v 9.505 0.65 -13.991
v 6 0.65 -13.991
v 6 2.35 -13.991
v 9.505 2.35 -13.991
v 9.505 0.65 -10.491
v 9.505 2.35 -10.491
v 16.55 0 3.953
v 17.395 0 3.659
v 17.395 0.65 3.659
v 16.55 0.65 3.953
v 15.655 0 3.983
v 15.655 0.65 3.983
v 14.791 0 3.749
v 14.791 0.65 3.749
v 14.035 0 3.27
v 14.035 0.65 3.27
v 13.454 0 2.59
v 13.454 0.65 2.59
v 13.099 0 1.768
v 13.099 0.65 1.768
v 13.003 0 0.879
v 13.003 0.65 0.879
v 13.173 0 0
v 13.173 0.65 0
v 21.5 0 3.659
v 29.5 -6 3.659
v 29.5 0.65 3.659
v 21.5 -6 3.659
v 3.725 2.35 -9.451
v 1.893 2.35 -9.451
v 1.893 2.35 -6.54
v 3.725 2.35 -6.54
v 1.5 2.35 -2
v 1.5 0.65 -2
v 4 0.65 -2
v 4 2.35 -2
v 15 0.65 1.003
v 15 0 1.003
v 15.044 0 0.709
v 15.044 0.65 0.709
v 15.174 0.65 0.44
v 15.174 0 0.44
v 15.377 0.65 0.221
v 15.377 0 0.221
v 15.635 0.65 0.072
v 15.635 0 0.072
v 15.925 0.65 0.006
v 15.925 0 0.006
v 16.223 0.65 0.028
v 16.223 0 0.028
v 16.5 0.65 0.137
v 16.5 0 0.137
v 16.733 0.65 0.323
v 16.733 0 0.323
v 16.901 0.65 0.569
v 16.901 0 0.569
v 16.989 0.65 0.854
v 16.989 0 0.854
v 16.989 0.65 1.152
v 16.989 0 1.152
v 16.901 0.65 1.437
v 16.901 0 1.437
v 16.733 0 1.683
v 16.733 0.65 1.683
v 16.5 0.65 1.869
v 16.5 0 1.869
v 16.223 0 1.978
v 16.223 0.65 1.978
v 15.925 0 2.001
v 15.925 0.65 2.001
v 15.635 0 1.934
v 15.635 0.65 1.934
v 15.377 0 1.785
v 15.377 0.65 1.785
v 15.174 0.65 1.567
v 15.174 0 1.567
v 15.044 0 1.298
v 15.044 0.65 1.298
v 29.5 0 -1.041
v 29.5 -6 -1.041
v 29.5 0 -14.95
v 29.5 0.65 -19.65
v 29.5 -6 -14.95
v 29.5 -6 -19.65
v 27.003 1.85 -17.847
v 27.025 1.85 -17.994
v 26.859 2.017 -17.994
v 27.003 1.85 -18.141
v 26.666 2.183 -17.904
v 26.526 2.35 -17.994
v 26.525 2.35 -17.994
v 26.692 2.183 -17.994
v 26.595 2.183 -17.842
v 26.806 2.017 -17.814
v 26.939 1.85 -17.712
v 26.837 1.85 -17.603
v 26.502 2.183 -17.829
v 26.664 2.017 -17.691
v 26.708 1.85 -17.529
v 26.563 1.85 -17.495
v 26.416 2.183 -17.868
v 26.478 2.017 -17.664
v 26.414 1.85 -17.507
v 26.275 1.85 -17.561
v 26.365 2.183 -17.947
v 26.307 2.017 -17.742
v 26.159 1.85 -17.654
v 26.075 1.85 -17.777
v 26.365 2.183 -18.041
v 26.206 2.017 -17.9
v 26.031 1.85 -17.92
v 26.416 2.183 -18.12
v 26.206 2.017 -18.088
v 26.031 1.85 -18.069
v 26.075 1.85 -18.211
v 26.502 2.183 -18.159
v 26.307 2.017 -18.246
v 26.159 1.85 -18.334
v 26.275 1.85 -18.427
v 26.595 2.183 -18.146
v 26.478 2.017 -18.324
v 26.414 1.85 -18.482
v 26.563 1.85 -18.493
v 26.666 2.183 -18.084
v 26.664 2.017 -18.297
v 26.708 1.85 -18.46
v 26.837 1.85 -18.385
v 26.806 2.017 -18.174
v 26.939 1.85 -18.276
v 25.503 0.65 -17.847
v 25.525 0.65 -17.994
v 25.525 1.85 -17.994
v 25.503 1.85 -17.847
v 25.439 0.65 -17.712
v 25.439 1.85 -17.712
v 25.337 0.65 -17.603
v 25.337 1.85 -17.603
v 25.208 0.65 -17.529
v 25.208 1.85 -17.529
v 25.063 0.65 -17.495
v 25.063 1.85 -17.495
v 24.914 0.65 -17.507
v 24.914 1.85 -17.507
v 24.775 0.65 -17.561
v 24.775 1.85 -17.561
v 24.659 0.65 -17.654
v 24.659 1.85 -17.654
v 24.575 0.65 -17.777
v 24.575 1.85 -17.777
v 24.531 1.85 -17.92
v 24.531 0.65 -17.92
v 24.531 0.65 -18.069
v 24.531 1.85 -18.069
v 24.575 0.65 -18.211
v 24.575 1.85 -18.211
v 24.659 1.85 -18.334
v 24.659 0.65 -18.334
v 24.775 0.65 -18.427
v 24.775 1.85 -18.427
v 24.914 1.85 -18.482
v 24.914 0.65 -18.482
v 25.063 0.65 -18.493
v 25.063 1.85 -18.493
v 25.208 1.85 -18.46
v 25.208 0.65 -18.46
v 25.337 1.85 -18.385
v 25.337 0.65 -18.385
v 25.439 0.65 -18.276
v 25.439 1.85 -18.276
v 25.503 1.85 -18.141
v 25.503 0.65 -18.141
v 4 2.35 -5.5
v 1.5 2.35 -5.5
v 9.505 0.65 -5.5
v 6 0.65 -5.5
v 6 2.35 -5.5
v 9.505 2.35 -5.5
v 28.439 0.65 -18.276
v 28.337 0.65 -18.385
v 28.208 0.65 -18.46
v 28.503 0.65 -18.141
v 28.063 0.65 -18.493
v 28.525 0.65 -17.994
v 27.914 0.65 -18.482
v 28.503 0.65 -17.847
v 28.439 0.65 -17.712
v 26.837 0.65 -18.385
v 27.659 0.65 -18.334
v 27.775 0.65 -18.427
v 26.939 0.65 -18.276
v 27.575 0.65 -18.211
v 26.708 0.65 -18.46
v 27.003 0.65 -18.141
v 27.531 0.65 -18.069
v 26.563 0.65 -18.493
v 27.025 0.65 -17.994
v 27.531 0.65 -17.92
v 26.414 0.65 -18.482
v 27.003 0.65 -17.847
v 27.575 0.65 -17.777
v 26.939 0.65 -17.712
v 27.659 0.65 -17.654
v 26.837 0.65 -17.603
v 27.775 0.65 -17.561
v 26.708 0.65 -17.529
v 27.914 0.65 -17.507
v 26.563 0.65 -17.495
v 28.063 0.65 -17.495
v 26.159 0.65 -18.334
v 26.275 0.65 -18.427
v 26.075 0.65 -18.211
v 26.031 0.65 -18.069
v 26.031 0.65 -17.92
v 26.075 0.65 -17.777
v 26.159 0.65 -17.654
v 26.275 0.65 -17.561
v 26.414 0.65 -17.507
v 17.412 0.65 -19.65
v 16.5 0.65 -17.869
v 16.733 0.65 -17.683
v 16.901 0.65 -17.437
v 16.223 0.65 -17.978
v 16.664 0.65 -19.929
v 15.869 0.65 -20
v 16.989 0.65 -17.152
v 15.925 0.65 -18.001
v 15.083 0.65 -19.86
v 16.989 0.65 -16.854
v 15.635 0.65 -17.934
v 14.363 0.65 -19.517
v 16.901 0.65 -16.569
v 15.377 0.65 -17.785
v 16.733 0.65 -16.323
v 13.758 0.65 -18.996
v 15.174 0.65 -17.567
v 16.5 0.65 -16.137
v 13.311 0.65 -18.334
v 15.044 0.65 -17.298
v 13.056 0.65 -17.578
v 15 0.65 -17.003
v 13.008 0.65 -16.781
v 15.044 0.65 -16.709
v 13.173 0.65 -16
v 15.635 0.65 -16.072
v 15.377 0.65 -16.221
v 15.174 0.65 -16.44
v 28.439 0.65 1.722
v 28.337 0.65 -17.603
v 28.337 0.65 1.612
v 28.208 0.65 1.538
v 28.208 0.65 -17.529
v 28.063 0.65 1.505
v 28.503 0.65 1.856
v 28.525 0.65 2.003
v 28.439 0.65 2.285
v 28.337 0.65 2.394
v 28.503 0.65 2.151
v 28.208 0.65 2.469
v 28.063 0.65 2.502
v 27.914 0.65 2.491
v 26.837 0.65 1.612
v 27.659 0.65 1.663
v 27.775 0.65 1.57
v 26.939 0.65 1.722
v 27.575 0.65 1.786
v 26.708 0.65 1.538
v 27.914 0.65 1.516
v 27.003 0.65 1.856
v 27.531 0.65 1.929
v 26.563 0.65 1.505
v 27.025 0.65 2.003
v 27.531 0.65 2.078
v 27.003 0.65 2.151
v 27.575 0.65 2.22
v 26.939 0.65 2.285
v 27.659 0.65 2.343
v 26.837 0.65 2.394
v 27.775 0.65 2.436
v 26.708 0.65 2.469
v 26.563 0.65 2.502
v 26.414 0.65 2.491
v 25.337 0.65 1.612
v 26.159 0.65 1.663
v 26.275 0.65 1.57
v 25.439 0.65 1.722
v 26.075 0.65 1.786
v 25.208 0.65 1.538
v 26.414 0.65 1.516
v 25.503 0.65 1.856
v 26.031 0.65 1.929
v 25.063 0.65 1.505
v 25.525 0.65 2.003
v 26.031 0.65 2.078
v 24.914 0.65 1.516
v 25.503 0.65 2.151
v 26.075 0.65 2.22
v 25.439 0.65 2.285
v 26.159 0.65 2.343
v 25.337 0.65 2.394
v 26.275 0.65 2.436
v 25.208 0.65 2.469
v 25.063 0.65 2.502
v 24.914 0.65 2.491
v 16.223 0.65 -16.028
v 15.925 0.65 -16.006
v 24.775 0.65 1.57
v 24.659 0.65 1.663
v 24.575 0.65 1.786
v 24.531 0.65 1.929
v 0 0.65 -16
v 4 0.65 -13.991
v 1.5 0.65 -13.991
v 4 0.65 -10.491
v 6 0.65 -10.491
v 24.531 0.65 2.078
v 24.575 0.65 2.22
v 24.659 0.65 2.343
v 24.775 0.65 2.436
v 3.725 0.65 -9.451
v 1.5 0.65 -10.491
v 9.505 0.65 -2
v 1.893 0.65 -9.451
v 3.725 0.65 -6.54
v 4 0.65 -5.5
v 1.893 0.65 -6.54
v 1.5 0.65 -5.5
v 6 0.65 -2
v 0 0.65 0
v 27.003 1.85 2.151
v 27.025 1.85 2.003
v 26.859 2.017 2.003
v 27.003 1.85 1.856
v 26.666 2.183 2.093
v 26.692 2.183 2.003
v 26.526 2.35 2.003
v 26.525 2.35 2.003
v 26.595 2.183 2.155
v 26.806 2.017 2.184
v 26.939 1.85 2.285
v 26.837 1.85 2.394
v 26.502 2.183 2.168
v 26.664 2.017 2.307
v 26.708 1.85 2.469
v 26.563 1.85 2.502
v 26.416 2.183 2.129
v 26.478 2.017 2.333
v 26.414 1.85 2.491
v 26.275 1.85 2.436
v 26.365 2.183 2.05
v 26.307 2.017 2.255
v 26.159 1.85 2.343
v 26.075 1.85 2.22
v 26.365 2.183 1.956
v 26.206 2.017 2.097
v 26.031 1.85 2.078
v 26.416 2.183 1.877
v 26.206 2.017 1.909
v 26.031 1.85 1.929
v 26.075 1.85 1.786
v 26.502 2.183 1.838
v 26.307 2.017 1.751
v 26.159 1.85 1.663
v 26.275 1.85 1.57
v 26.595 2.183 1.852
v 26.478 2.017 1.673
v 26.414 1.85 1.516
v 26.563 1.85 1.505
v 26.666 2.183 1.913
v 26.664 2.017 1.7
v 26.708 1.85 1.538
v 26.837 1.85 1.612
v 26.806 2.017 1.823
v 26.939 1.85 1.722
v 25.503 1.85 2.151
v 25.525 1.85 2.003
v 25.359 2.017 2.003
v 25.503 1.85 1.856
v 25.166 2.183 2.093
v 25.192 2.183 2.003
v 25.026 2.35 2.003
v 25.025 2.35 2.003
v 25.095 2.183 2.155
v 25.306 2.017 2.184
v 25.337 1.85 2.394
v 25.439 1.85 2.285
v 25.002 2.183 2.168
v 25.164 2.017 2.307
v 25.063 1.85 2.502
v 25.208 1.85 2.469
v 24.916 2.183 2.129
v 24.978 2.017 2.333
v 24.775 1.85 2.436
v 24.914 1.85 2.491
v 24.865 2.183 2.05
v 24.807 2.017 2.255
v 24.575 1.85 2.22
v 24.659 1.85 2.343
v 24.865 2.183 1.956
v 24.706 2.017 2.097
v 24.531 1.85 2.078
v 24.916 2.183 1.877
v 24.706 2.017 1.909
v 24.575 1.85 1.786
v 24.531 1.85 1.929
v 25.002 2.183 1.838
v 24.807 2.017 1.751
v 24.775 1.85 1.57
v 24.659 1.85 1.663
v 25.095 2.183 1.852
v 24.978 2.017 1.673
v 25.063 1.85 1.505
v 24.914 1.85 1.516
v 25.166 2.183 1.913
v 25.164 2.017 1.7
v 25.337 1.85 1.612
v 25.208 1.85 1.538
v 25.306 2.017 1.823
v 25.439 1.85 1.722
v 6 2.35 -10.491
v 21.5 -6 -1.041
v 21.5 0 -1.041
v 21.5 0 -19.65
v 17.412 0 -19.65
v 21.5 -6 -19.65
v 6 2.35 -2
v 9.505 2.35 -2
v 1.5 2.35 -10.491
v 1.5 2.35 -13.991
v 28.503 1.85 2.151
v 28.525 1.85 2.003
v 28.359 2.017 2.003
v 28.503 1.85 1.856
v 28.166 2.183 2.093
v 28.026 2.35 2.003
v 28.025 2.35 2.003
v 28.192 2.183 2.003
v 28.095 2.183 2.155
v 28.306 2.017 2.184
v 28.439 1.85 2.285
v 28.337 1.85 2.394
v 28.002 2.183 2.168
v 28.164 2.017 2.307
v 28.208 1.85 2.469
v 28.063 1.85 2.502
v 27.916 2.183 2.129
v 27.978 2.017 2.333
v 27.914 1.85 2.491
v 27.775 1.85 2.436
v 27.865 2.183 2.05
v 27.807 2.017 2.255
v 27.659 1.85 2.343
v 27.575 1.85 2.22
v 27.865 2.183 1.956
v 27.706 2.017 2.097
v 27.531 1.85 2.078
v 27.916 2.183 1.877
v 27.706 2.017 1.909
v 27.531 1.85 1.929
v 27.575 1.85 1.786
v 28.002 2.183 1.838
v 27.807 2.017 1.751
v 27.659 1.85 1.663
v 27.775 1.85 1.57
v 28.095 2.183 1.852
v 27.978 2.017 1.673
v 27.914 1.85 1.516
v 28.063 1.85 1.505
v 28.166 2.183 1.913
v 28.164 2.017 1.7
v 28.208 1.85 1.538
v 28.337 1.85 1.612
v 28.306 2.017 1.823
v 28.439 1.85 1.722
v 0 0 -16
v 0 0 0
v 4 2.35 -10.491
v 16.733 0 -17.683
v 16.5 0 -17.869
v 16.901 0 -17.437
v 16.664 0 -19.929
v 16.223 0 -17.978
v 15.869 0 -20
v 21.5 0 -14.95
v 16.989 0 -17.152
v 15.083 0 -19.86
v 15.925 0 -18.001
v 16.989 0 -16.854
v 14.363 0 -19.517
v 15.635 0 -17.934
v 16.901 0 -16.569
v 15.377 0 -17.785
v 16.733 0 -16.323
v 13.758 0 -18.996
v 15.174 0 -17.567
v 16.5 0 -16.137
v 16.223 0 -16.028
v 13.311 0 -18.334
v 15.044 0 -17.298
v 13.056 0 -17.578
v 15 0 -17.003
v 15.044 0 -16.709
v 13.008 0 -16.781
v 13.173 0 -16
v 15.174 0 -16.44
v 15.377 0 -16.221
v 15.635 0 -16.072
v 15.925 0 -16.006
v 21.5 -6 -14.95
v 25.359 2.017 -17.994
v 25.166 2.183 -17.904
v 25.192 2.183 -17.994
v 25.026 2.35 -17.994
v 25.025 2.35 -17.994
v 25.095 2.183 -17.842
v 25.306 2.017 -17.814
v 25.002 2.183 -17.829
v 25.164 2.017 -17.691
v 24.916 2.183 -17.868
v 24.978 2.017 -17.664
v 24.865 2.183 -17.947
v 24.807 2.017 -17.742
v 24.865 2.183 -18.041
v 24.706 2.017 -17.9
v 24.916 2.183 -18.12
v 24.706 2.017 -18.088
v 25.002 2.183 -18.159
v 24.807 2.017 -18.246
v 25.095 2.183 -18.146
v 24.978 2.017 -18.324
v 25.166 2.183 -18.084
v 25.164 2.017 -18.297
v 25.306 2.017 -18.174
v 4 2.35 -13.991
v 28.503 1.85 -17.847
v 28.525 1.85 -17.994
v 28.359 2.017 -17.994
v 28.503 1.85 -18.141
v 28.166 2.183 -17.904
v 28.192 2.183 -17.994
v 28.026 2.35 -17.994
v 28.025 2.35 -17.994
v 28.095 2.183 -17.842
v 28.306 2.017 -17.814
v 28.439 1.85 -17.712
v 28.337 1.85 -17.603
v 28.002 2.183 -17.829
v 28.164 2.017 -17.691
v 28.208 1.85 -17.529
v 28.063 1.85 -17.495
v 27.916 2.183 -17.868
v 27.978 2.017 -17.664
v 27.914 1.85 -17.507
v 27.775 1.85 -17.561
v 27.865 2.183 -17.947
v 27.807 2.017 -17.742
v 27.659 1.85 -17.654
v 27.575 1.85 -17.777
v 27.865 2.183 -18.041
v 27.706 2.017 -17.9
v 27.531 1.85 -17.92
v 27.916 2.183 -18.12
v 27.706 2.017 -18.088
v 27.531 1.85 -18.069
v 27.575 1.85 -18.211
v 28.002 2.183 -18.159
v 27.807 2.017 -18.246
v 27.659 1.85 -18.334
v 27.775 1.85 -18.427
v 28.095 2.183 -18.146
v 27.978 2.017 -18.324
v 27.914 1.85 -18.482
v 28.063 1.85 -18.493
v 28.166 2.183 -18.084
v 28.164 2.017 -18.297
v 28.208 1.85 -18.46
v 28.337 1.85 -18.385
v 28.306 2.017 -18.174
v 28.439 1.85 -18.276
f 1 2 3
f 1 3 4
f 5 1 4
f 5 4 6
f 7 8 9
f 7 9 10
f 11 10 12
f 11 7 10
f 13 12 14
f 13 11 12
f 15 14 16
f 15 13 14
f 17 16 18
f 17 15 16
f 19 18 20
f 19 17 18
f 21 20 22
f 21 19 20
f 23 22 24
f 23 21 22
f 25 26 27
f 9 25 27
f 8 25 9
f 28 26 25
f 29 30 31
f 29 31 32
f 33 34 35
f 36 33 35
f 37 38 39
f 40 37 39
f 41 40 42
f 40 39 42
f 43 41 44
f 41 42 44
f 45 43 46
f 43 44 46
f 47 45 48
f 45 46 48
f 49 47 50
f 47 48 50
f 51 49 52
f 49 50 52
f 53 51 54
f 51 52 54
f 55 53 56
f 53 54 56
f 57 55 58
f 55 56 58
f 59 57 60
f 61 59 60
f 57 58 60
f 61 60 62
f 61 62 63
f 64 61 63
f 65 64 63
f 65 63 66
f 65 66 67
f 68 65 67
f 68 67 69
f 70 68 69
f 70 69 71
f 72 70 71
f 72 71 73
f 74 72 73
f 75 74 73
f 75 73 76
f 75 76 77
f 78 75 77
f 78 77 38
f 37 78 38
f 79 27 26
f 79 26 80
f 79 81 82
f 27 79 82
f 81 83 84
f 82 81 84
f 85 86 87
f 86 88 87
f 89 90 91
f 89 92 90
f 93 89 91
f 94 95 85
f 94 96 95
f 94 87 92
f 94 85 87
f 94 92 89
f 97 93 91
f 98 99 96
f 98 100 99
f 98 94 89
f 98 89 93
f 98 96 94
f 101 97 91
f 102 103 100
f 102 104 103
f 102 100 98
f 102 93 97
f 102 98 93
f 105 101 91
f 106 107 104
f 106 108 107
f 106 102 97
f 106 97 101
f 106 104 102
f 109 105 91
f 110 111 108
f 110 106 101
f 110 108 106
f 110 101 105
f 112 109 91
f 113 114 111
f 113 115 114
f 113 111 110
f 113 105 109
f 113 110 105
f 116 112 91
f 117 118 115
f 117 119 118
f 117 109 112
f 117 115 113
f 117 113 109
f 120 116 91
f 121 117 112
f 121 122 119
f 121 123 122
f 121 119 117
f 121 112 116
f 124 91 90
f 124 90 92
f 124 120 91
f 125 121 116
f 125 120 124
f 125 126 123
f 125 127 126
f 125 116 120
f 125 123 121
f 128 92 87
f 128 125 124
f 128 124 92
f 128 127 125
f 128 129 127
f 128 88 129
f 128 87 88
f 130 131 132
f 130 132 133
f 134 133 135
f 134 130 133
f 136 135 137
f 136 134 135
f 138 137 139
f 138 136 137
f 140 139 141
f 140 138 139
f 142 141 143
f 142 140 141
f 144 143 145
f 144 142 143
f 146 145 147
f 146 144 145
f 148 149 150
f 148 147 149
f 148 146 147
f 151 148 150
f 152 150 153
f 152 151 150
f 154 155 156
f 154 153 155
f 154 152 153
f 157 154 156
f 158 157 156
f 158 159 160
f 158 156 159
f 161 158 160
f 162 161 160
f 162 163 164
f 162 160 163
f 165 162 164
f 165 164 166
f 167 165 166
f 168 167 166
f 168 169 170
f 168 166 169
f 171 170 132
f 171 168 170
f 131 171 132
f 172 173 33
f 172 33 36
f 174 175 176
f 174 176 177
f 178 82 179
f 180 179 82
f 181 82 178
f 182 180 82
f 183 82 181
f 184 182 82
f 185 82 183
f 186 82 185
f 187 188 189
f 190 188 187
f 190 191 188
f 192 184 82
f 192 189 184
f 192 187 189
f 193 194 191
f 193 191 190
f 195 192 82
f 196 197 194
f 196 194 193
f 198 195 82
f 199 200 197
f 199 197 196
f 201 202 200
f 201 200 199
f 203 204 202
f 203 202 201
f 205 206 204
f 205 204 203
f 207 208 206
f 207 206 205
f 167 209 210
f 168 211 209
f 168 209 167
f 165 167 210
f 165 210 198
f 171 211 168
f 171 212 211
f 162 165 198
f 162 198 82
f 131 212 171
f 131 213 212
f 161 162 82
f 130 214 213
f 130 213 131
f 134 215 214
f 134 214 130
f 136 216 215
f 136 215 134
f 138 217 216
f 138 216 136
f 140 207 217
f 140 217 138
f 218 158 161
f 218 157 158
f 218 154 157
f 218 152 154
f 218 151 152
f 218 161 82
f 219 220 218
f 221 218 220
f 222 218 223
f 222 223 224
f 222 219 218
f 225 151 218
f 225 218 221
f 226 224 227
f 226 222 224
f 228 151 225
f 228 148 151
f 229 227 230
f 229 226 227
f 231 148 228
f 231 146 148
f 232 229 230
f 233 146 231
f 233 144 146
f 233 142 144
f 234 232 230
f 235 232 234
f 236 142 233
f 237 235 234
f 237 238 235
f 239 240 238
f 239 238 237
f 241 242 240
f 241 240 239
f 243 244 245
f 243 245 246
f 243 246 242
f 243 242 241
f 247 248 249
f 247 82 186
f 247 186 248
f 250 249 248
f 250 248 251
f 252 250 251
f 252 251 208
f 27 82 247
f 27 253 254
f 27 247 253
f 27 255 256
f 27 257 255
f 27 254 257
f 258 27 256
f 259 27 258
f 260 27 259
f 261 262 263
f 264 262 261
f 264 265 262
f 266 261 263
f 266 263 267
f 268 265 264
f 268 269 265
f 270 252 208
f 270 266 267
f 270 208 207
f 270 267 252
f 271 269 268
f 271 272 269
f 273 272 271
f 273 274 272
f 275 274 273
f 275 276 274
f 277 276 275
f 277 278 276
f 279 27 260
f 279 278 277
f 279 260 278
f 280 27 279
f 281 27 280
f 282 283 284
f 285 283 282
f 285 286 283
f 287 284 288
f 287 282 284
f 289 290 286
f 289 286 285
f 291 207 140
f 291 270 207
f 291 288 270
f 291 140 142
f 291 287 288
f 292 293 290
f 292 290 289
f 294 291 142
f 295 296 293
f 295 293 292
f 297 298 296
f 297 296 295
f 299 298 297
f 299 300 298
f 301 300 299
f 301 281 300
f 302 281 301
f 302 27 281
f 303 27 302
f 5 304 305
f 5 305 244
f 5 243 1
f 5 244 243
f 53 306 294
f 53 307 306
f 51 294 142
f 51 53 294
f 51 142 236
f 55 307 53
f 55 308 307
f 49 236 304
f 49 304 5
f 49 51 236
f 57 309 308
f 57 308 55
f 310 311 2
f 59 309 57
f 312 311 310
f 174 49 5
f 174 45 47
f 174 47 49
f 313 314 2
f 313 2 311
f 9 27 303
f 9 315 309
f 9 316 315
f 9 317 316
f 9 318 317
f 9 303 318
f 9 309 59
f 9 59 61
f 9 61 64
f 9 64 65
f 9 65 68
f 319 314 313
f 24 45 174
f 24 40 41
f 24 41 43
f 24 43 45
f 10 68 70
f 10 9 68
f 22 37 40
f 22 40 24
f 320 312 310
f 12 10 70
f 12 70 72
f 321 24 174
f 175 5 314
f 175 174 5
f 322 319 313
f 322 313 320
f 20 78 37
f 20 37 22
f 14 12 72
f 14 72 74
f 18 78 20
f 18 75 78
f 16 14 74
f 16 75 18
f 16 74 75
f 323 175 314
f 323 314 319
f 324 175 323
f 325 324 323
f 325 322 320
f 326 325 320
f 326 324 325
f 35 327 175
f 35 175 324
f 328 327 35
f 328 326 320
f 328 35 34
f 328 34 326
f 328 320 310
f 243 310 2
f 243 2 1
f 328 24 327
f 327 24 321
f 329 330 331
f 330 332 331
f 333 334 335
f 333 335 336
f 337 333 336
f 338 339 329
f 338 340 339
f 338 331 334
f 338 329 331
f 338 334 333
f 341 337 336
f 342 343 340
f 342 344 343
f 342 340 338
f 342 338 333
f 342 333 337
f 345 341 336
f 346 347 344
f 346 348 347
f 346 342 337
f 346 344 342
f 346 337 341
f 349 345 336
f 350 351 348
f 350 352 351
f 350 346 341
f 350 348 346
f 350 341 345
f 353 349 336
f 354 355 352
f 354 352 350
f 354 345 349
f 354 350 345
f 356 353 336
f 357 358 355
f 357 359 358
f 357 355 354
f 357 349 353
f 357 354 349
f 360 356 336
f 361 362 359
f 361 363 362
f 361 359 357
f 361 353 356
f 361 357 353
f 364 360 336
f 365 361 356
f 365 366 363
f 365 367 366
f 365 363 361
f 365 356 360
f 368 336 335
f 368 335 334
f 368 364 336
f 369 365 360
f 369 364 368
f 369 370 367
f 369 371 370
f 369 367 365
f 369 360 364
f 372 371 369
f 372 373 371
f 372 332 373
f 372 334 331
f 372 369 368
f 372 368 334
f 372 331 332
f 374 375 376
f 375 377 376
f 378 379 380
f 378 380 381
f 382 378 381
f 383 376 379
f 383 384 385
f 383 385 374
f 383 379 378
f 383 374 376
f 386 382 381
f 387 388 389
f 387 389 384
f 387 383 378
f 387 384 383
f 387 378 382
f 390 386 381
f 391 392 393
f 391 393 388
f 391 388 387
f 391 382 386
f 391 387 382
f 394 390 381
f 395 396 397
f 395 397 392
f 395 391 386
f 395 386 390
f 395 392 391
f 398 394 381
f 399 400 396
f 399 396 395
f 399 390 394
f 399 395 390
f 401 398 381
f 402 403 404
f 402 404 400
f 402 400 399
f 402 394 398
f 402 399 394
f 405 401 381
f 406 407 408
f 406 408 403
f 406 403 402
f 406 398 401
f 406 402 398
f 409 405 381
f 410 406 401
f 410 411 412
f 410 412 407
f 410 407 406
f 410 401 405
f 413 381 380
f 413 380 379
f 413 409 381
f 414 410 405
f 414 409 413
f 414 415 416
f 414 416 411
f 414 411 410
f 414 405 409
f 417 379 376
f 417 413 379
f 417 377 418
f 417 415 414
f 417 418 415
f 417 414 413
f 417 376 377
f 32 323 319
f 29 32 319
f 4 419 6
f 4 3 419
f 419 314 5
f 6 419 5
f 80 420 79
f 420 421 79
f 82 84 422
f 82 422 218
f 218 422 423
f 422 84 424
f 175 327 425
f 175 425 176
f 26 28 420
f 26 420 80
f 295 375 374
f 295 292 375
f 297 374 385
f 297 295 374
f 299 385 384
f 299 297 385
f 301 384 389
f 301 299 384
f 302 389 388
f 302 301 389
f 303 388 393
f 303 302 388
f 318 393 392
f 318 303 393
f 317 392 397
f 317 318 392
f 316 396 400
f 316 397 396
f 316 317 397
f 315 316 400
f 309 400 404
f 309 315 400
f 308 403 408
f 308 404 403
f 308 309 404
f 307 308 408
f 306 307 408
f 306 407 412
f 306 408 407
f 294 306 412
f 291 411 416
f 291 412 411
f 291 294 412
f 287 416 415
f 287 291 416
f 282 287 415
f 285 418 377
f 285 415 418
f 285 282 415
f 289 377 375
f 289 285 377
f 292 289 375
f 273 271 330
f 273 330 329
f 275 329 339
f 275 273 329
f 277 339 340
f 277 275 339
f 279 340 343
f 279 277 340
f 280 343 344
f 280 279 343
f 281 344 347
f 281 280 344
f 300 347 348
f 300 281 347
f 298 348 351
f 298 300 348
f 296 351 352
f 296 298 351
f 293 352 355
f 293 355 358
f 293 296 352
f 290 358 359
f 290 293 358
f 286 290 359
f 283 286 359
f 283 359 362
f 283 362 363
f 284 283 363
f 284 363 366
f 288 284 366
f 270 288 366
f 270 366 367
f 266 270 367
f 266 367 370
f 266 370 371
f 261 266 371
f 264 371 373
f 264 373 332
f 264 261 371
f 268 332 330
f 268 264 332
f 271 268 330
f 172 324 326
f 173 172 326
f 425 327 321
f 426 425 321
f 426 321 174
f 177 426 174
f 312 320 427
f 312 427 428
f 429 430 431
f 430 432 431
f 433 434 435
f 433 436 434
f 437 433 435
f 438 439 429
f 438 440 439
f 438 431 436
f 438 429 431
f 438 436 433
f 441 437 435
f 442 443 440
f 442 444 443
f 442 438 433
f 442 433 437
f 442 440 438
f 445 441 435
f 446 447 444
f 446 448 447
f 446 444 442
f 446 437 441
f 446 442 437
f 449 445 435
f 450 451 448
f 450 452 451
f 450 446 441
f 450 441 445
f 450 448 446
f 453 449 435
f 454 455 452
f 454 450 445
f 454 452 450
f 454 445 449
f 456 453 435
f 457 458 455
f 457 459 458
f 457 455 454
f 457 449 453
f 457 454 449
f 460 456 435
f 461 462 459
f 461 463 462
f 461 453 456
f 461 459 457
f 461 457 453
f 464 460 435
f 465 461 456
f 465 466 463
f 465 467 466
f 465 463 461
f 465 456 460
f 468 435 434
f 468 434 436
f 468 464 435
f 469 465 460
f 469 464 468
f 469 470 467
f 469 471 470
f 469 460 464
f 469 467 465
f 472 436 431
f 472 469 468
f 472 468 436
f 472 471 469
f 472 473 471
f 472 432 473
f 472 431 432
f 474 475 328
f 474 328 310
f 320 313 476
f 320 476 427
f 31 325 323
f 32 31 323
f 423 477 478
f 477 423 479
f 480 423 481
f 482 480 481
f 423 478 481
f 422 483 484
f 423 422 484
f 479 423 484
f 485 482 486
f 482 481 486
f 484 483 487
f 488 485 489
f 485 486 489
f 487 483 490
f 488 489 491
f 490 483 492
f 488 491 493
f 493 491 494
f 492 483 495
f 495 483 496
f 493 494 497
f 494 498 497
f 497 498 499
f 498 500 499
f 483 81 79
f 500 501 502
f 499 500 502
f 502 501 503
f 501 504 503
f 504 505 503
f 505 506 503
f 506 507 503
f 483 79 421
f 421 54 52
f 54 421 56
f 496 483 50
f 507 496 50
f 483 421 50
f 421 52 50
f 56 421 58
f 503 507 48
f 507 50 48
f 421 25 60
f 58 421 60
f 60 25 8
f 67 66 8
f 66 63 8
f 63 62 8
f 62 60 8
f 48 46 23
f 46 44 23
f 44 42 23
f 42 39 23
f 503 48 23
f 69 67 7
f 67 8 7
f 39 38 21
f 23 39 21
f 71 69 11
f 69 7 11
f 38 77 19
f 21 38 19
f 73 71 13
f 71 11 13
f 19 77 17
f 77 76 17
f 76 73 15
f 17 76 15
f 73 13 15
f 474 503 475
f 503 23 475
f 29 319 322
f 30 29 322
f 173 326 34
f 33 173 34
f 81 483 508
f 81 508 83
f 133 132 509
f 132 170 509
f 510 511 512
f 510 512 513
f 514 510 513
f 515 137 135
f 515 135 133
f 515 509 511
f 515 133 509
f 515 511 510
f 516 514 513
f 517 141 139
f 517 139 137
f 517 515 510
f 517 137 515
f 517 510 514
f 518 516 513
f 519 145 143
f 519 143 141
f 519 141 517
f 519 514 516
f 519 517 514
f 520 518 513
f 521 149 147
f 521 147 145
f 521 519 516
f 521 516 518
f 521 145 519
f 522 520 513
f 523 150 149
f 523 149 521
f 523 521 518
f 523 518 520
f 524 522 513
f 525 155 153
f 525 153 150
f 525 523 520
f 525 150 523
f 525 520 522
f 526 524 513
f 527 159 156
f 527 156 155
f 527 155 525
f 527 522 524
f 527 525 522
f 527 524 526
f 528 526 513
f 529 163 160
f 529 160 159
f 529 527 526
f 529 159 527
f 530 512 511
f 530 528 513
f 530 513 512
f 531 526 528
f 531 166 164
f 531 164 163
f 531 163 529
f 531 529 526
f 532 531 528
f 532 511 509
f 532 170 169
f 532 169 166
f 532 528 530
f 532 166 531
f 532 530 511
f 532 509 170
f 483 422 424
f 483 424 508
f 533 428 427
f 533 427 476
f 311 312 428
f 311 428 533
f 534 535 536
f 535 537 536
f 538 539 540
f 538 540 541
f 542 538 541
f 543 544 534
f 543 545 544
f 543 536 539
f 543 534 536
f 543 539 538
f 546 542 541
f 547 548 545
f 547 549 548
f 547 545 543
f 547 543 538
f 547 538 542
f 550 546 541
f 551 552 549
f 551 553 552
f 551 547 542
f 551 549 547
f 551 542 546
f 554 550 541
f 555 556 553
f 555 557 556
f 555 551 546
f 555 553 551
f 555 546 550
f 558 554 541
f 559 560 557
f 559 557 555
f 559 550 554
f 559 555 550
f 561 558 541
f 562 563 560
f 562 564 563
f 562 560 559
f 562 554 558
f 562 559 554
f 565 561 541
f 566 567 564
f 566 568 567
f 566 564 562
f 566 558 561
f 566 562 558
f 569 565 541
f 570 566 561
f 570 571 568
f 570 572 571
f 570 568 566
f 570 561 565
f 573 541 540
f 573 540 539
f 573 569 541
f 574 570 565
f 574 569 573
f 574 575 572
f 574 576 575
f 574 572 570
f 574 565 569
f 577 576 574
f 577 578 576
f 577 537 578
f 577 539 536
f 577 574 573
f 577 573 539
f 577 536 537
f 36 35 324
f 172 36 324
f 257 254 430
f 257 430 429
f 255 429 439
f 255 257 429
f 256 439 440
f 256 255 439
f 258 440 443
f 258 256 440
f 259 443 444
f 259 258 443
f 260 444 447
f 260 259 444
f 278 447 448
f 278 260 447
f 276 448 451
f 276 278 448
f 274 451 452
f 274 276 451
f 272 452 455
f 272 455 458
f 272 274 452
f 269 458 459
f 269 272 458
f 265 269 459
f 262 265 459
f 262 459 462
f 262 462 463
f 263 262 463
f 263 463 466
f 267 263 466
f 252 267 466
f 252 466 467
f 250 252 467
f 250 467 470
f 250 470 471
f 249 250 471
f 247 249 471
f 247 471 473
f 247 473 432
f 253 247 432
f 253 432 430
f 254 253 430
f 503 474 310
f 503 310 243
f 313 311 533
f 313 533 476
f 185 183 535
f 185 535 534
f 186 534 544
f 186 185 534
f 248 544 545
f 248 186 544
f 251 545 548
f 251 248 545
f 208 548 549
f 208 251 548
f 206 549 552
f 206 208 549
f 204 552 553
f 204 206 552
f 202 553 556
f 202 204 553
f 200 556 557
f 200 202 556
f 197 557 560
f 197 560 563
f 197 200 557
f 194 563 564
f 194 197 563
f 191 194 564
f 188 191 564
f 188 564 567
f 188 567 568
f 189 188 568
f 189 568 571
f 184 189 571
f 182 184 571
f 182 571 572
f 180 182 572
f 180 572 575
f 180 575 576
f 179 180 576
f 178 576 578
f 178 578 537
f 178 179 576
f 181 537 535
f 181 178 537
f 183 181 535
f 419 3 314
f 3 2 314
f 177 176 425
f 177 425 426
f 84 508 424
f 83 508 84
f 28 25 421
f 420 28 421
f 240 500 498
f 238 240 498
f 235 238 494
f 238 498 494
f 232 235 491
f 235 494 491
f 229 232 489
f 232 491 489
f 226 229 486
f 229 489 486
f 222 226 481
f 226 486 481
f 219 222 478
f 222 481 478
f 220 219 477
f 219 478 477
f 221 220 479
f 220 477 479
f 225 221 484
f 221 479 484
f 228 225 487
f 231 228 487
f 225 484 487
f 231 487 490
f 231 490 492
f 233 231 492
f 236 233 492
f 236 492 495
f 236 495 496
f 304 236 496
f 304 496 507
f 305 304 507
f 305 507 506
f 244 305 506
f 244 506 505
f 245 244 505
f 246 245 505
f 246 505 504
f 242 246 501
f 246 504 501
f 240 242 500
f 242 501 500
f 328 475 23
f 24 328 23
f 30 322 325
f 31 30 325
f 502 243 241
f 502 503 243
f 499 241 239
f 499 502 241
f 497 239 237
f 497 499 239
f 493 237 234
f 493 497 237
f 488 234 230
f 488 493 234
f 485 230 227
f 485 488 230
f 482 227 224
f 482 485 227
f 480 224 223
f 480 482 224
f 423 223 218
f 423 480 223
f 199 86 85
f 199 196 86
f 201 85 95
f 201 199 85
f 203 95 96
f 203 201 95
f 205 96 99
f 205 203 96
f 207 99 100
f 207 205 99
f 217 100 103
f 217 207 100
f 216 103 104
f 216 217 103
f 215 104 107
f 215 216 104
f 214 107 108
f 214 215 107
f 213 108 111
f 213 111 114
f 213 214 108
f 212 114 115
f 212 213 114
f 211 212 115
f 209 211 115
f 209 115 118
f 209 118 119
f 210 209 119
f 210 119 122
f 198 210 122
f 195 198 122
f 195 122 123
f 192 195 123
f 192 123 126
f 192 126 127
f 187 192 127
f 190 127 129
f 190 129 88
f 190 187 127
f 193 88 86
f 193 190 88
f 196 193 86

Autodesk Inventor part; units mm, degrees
ref_plane "YZ Plane" through (0, 0, 0) normal (1, 0, 0) x (0, 1, 0)
ref_plane "XZ Plane" through (0, 0, 0) normal (0, 1, 0) x (-1, 0, 0)
ref_plane "XY Plane" through (0, 0, 0) normal (0, 0, 1) x (1, 0, 0)
sketch "Sketch1" plane through (0, 0, 0) normal (0, 1, 0) x (-1, 0, 0)
  line L0 (0, 0) -> (0, -16)
  line L1 (0, -16) -> (-13, -16)
  circle A0 centre (48.4003, -12.7173) radius 1 projected
  circle A1 centre (48.4003, 5.2827) radius 1 projected
  line L2 (0, 0) -> (-13, 0)
  line L3 (-16, 0) -> (-16, 1.0033)
  line L4 (-16, -16) -> (-16, -17.0033)
  circle A2 centre (-16, 1.0033) radius 1
  circle A3 centre (-16, -17.0033) radius 1
  arc A4 (-18.8273, -16) -> (-13.1727, -16) centre (-16, -17.0033) ccw
  arc A5 (-13.1727, 0) -> (-18.8273, 0) centre (-16, 1.0033) ccw
  line L5 (-19, 0) -> (-29.5, 0)
  line L6 (-19, -16) -> (-29.5, -16)
  line L7 (-29.5, 0) -> (-29.5, -16)
  line L8 (-29.5, -8) -> (-29.5, -19.65)
  line L9 (-29.5, -8) -> (-29.5, 3.6592)
  line L10 (-29.5, 3.6592) -> (-17.3951, 3.6592)
  line L11 (-29.5, -19.65) -> (-17.4124, -19.65)
  line L12 (-13, 0) -> (-13.1727, 0)
  line L13 (-18.8273, 0) -> (-19, 0)
  line L14 (-13, -16) -> (-13.1727, -16)
  line L15 (-18.8273, -16) -> (-19, -16)
  dimension "d0" = 16
  dimension "d1" = 13
  dimension "d2" = 6
  dimension "d3" = 1.0033
  dimension "d4" = 1.0033
  dimension "d5" = 2
  dimension "d6" = 2
  dimension "d7" = 6
  dimension "d8" = 6
  dimension "d9" = 6
  dimension "d10" = 13
  dimension "d11" = 10.5
  dimension "d12" = 11.65
extrude "Extrusion1" add sketch "Sketch1" along normal blind 0.65 contours L0 L1 L14 A4 L15 L6 L7 L5 L13 A5 L12 L2 | A5 L13 L5 L9 L10 | L11 L8 L6 L15 A4
sketch "Sketch2" plane through (0, 0.65, 0) normal (0, 1, 0) x (1, 0, 0)
  line L0 (0, 0) -> (13.1727, 0) projected
  circle A0 centre (16, -1.0033) radius 1 projected
  circle A1 centre (16, 17.0033) radius 1 projected
  line L1 (17.3951, -3.6592) -> (29.5, -3.6592) projected
  line L2 (29.5, -3.6592) -> (29.5, 19.65) projected
  line L3 (29.5, 19.65) -> (17.4124, 19.65) projected
  arc A2 (17.4124, 19.65) -> (13.1727, 16) centre (16, 17.0033) ccw projected
  line L4 (13.1727, 16) -> (0, 16) projected
  line L5 (0, 16) -> (0, 0) projected
  line L6 (0, 0) -> (13.1727, 0) projected
  arc A3 (13.1727, 0) -> (17.3951, -3.6592) centre (16, -1.0033) ccw projected
  line L7 (0, 0) -> (1.5, 0)
  line L8 (1.5, 0) -> (1.5, 2)
  line L9 (1.5, 2) -> (0, 2)
  line L10 (0, 2) -> (0, 0)
  line L11 (1.5, 2) -> (4, 2)
  line L12 (4, 2) -> (4, 5.5)
  line L13 (4, 5.5) -> (1.5, 5.5)
  line L14 (1.5, 5.5) -> (1.5, 2)
  line L15 (4, 2) -> (6, 2)
  line L16 (4, 2) -> (6, 2) construction
  line L17 (6, 2) -> (6, 5.5)
  line L18 (6, 5.5) -> (9.5052, 5.5)
  line L19 (6, 2) -> (9.5052, 2)
  line L20 (9.5052, 2) -> (9.5052, 5.5)
  line L21 (9.5052, 5.5) -> (6, 5.5)
  line L22 (6, 5.5) -> (6, 2)
  circle A4 centre (28.0254, -2.0033) radius 0.5
  circle A5 centre (26.5254, -2.0033) radius 0.5
  line L23 (26.5254, -2.0033) -> (28.0254, -2.0033)
  line L24 (26.5254, -2.0033) -> (25.0254, -2.0033)
  circle A6 centre (25.0254, -2.0033) radius 0.5
  line L25 (29.5, 7.9954) -> (27.2754, 7.9954)
  line L26 (1.5, 15.9908) -> (1.5, 13.9908)
  line L27 (1.5, 13.9908) -> (0, 13.9908)
  line L28 (1.5, 13.9908) -> (4, 13.9908)
  line L29 (4, 13.9908) -> (4, 10.4908)
  line L30 (4, 10.4908) -> (1.5, 10.4908)
  line L31 (1.5, 10.4908) -> (1.5, 13.9908)
  line L32 (4, 13.9908) -> (6, 13.9908)
  line L33 (4, 13.9908) -> (6, 13.9908) construction
  line L34 (6, 13.9908) -> (6, 10.4908)
  line L35 (6, 10.4908) -> (9.5052, 10.4908)
  line L36 (6, 13.9908) -> (9.5052, 13.9908)
  line L37 (9.5052, 13.9908) -> (9.5052, 10.4908)
  line L38 (9.5052, 10.4908) -> (6, 10.4908)
  line L39 (6, 10.4908) -> (6, 13.9908)
  circle A7 centre (28.0254, 17.9941) radius 0.5
  circle A8 centre (26.5254, 17.9941) radius 0.5
  line L40 (26.5254, 17.9941) -> (28.0254, 17.9941)
  line L41 (26.5254, 17.9941) -> (25.0254, 17.9941)
  circle A9 centre (25.0254, 17.9941) radius 0.5
  line L42 (1.893, 6.5402) -> (3.725, 6.5402)
  line L43 (3.725, 6.5402) -> (3.725, 9.4507)
  line L44 (3.725, 9.4507) -> (1.893, 9.4507)
  line L45 (1.893, 9.4507) -> (1.893, 6.5402)
  dimension "d15" = 1.5
  dimension "d16" = 2
  dimension "d17" = 2.5
  dimension "d18" = 3.5
  dimension "d19" = 2
  dimension "d20" = 0
  dimension "d21" = 3.5052
  dimension "d22" = 90
  dimension "d23" = 1
  dimension "d24" = 1
  dimension "d25" = 1.5
  dimension "d26" = 1.5
  dimension "d27" = 1
  dimension "d33" = 1.0402
  dimension "d34" = 1.0402
extrude "Extrusion2" add sketch "Sketch2" along normal blind 1.7 contours L14 L13 L12 L11 | L17 L18 L20 L19 | A4 | L23 L24 A5 | A5 L24 L23 | A6 | L28 L29 L30 L31 | L36 L37 L35 L34 | A7 | L40 L41 A8 | A8 L41 L40 | A9 | L45 L44 L43 L42
chamfer "Chamfer1" distance 0.5 angle 45 6 edges at (27.5254, 2.35, -17.9941) (26.0254, 2.35, -17.9941) (24.5254, 2.35, -17.9941) (27.5254, 2.35, 2.0033) (26.0254, 2.35, 2.0033) (24.5254, 2.35, 2.0033)
sketch "Sketch3" plane through (0, 0, 0) normal (0, -1, 0) x (1, 0, 0)
  circle A0 centre (16, -17.0033) radius 1 projected
  circle A1 centre (16, 1.0033) radius 1 projected
  line L0 (29.5, 3.6592) -> (29.5, -19.65) projected
  line L1 (17.3951, 3.6592) -> (29.5, 3.6592) projected
  arc A2 (17.3951, 3.6592) -> (13.1727, 0) centre (16, 1.0033) ccw projected
  line L2 (0, 0) -> (13.1727, 0) projected
  line L3 (0, -16) -> (0, 0) projected
  line L4 (13.1727, -16) -> (0, -16) projected
  arc A3 (13.1727, -16) -> (17.4124, -19.65) centre (16, -17.0033) ccw projected
  line L5 (29.5, -19.65) -> (17.4124, -19.65) projected
  line L6 (0, -16) -> (8, -16)
  line L7 (8, -16) -> (8, -11.3)
  line L8 (8, -11.3) -> (0, -11.3)
  line L9 (0, -11.3) -> (0, -16)
  line L10 (0, -16) -> (0, 0) projected
  line L11 (0, -8) -> (1.7097, -8)
  line L12 (0, 0) -> (0, -16)
  line L13 (13.1727, 0) -> (0, 0)
  line L14 (0, 0) -> (8, 0)
  line L15 (8, 0) -> (8, -4.7)
  line L16 (8, -4.7) -> (0, -4.7)
  line L17 (0, -4.7) -> (0, 0)
  line L18 (0, 0) -> (0, -16)
  line L19 (29.5, 3.6592) -> (29.5, -19.65) projected
  line L20 (29.5, -19.65) -> (21.5, -19.65)
  line L21 (21.5, -19.65) -> (21.5, -14.95)
  line L22 (21.5, -14.95) -> (29.5, -14.95)
  line L23 (29.5, -14.95) -> (29.5, -19.65)
  line L24 (29.5, 3.6592) -> (21.5, 3.6592)
  line L25 (21.5, 3.6592) -> (21.5, -1.0408)
  line L26 (21.5, -1.0408) -> (29.5, -1.0408)
  line L27 (29.5, -1.0408) -> (29.5, 3.6592)
  dimension "d35" = 8
  dimension "d36" = 4.7
  dimension "d39" = 8
  dimension "d40" = 4.7
  dimension "d41" = 8
  dimension "d42" = 4.7
extrude "Extrusion3" add sketch "Sketch3" along normal blind 6 contours L0 L26 L25 L1 | L0 L5 L21 L22
equation "\"d34\" = d33"
properties part number "Encoder"
